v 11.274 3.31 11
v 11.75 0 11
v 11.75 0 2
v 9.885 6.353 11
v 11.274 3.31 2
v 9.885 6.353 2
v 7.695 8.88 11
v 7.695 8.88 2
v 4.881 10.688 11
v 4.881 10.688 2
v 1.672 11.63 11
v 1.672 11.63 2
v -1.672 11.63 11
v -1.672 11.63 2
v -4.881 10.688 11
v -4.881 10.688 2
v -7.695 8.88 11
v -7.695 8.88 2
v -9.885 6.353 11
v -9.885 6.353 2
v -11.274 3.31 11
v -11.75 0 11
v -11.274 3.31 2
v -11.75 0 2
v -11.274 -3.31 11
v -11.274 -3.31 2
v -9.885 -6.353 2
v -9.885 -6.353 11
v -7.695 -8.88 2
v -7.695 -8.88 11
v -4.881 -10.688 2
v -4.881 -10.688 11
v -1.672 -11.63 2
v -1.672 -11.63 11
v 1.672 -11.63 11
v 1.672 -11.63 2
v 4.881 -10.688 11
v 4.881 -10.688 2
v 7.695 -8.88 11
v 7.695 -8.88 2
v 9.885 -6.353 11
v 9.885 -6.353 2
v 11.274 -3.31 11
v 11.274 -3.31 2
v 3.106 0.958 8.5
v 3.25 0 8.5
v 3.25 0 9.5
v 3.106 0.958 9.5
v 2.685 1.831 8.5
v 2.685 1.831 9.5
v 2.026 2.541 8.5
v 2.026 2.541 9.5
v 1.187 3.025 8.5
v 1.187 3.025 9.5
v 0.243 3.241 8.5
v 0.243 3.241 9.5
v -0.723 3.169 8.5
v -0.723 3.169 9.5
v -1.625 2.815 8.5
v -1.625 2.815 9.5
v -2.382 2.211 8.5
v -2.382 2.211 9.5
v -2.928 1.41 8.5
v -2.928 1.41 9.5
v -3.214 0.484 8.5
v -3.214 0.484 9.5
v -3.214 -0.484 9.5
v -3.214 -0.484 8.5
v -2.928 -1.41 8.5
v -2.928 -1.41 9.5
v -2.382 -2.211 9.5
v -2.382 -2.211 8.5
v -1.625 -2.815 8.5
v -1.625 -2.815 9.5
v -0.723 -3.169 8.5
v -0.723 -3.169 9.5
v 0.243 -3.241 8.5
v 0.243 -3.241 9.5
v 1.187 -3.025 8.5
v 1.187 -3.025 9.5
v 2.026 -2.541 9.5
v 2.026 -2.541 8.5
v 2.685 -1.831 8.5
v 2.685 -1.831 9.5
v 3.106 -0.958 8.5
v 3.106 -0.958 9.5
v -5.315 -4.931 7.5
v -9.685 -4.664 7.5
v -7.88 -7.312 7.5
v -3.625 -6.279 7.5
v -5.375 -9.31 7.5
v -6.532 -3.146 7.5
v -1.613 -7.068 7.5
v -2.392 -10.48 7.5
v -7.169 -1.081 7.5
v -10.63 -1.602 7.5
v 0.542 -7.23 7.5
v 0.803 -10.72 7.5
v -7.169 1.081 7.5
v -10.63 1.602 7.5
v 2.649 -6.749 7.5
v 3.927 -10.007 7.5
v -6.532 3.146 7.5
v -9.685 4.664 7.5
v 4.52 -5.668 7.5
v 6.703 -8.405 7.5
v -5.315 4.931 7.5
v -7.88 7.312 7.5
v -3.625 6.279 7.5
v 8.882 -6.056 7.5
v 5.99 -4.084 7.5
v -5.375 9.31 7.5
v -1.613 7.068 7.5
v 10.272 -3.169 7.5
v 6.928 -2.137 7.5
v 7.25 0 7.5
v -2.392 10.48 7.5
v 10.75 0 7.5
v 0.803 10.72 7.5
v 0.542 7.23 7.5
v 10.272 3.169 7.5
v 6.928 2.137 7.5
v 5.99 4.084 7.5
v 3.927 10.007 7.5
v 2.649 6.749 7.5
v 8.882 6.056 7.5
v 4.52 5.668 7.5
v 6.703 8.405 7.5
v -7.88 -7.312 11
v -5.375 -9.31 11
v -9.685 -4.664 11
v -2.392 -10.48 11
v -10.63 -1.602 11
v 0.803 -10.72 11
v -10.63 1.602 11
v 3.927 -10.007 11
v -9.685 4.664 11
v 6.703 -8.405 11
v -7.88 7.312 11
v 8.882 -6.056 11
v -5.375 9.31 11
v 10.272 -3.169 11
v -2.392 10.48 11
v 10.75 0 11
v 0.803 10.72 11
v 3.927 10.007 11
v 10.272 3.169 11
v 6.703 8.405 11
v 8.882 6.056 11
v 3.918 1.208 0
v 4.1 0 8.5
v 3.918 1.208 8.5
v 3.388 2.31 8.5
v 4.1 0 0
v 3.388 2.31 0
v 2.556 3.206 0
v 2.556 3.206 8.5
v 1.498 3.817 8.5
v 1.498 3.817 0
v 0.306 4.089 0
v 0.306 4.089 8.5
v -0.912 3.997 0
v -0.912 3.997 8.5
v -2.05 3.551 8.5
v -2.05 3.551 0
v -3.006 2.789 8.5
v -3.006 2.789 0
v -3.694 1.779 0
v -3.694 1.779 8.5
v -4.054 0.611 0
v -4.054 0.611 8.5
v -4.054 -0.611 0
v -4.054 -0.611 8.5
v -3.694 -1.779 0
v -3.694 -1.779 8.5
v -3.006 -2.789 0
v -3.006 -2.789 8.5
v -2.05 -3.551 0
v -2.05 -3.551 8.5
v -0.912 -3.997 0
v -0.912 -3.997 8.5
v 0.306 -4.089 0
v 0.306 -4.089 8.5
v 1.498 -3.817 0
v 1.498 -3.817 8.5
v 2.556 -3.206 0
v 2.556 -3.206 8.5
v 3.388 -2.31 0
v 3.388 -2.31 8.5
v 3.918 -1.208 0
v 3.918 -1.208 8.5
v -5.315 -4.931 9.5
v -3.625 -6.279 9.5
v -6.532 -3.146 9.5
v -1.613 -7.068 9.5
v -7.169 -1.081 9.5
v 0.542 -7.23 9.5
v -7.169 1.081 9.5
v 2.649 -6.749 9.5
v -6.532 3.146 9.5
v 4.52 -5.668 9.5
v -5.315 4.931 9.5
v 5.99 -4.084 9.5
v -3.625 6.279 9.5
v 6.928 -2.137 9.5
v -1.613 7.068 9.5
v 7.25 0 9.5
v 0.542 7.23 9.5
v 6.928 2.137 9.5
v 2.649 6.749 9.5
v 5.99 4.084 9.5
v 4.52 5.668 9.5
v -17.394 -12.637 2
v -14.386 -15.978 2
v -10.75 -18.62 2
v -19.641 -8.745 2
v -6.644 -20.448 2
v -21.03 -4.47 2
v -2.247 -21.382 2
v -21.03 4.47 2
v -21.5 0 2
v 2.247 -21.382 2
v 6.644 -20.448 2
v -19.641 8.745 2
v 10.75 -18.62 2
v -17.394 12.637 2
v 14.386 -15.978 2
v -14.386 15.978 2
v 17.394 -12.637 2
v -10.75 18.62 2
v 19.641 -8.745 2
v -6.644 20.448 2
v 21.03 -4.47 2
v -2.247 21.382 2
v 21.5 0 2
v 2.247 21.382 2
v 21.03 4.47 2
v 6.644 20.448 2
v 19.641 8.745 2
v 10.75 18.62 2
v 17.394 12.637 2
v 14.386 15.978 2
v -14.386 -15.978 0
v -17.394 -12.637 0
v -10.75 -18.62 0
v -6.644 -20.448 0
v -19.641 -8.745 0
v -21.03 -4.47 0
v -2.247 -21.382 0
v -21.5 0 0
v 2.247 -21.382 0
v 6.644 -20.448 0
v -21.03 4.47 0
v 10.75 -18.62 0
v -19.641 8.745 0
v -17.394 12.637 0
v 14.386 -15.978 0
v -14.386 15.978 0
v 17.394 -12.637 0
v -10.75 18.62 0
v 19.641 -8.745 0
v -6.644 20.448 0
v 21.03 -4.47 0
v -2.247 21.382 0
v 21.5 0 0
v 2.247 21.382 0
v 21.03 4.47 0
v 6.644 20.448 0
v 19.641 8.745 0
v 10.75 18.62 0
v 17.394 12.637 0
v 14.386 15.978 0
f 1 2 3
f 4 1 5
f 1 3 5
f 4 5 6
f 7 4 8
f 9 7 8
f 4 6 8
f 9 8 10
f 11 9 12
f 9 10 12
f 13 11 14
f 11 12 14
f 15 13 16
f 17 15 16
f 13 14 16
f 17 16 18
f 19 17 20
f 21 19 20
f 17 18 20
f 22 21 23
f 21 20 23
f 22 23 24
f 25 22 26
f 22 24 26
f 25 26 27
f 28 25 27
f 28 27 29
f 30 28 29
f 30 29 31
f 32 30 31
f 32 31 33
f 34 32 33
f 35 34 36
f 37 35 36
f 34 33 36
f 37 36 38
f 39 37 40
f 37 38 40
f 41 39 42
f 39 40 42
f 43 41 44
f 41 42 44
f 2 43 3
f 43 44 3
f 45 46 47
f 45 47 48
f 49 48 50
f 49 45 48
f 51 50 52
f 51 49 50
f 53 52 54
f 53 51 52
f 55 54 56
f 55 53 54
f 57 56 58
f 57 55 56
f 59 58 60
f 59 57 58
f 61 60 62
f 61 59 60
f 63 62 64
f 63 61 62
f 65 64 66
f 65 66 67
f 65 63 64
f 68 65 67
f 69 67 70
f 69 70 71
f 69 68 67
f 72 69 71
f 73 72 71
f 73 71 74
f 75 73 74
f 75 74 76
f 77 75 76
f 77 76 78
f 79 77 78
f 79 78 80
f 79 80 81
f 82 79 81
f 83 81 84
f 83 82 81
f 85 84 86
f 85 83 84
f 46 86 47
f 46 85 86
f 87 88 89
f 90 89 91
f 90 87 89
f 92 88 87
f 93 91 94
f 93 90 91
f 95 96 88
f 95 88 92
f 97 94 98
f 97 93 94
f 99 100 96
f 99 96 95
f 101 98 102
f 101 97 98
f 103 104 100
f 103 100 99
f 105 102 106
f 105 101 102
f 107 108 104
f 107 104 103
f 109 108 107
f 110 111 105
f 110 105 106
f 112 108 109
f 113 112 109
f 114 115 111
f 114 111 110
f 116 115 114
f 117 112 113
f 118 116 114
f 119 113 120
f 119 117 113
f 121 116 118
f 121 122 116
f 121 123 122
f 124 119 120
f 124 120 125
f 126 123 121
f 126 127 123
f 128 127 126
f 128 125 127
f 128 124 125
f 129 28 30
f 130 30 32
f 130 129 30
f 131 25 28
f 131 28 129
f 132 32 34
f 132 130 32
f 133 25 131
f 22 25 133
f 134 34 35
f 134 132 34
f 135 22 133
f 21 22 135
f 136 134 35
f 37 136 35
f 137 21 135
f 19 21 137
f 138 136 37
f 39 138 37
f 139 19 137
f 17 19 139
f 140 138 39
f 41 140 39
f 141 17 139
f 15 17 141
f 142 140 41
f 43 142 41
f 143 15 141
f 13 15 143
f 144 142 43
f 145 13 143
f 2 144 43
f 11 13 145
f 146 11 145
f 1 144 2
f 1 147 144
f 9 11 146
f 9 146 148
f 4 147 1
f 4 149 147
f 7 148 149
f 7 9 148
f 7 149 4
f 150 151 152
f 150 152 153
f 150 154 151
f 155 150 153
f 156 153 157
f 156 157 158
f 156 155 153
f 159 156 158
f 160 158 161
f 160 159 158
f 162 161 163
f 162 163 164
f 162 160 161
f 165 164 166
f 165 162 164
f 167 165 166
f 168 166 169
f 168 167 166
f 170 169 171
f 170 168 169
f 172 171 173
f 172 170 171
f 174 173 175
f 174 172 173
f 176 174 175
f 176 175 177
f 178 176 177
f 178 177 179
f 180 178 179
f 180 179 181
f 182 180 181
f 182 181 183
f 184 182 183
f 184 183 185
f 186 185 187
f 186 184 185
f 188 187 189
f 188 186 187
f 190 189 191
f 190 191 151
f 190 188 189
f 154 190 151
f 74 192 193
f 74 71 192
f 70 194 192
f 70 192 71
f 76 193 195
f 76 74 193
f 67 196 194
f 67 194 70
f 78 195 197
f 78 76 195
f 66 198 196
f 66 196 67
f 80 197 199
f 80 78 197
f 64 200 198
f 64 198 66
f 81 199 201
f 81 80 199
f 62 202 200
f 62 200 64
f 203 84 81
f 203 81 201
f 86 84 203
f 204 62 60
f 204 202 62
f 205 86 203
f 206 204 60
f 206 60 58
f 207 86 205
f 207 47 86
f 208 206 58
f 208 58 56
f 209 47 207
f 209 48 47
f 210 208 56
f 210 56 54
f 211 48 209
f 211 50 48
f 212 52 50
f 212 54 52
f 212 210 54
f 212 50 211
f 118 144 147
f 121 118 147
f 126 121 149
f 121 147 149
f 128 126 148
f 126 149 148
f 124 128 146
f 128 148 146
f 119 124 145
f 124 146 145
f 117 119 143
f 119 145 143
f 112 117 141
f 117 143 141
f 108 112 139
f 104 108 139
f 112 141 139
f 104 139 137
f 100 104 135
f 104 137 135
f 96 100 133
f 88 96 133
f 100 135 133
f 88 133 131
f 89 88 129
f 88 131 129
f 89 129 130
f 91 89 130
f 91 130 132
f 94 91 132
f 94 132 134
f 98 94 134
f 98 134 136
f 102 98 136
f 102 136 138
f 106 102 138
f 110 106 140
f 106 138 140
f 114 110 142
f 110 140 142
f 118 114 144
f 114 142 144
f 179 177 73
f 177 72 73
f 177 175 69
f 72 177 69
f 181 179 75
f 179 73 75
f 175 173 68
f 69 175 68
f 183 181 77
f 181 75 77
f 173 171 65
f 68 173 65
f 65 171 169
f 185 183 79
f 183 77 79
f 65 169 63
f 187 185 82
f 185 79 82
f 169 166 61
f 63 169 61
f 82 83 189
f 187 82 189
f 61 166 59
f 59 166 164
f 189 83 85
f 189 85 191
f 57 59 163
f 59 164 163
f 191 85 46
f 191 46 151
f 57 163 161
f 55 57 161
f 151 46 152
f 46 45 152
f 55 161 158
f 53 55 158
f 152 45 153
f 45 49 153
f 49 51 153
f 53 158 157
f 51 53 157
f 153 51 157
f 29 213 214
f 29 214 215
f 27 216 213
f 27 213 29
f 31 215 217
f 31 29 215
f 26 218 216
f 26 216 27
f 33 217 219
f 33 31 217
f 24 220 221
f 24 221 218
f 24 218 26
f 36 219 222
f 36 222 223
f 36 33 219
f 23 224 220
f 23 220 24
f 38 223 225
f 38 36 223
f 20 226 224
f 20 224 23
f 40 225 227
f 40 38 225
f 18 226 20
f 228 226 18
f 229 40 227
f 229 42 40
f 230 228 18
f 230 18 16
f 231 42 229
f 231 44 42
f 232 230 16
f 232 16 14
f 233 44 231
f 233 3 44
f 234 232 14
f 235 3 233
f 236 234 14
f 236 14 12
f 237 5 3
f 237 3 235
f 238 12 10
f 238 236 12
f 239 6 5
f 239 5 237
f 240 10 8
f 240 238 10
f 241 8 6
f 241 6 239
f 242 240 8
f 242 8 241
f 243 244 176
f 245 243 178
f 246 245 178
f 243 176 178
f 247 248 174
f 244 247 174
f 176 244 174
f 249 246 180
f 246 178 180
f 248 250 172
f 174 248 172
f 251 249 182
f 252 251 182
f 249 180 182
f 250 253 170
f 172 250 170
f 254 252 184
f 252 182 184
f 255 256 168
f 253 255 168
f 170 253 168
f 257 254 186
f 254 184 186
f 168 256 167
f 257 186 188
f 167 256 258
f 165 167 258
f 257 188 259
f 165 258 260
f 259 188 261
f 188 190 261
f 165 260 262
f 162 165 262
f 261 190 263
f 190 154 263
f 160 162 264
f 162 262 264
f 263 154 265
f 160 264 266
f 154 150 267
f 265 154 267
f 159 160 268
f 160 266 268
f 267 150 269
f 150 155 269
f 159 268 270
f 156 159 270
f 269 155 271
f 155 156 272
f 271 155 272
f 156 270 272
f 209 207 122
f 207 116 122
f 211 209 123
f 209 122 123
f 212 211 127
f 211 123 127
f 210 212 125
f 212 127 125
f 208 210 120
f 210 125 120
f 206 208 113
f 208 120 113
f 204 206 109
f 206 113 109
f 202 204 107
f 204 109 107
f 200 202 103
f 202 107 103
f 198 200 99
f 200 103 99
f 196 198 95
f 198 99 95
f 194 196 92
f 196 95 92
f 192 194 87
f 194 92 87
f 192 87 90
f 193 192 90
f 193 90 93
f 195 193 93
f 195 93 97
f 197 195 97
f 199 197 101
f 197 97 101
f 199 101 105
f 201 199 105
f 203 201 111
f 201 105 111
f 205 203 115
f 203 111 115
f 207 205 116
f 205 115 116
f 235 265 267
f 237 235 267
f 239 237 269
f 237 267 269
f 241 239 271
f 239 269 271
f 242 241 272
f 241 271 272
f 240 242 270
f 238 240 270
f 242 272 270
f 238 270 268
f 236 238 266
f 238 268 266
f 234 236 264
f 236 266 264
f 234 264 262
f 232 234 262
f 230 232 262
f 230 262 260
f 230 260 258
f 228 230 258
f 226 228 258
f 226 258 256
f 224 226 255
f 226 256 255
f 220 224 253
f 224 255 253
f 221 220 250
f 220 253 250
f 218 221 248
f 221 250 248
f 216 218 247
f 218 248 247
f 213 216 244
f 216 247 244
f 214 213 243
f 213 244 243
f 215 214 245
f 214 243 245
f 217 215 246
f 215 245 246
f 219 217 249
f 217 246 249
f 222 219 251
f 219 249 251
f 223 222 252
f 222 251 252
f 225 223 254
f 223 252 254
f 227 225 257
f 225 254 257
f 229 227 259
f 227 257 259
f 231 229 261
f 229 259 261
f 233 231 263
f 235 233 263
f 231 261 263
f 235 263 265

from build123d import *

# Parameters (mm, degrees)
F0_R     = 21.5
F0_R_2   = 4.1
F1_DEPTH = 2
F2_R     = 11.75
F2_R_2   = 4.1
F3_DEPTH = 9
F4_R     = 10.75
F4_R_2   = 7.25
F5_DEPTH = 3.5
F6_DEPTH = 2.5
F7_R     = 7.25
F7_R_2   = 4.1
F7_R_3   = 3.25
F8_DEPTH = 1


with BuildPart() as f1:
    # F0 (on Top) → F1 (new body)
    with BuildSketch(Plane.XY):
        Circle(F0_R)
        Circle(F0_R_2, mode=Mode.SUBTRACT)
    extrude(amount=F1_DEPTH)

    # F2 (on face) → F3 (join)
    with BuildSketch(Plane.XY.offset(2)):
        Circle(F2_R)
        Circle(F2_R_2, mode=Mode.SUBTRACT)
    extrude(amount=F3_DEPTH)

    # F4 (on face) → F5 (cut)
    with BuildSketch(Plane.XY.offset(11)):
        Circle(F4_R)
        Circle(F4_R_2, mode=Mode.SUBTRACT)
    extrude(amount=-F5_DEPTH, mode=Mode.SUBTRACT)

    # F6 (cut): a face of the model
    f6_faces = [f1.faces().sort_by_distance(p)[0] for p in [
        (-7.0449390335, 0, 11),
    ]]
    extrude(f6_faces, amount=-F6_DEPTH, mode=Mode.SUBTRACT)

    # F7 (on face) → F8 (join)
    with BuildSketch(Plane.XY.offset(8.5)):
        Circle(F7_R)
        Circle(F7_R_2, mode=Mode.SUBTRACT)
        Circle(F7_R_2)
        Circle(F7_R_3, mode=Mode.SUBTRACT)
    extrude(amount=F8_DEPTH)


solid = f1.part
